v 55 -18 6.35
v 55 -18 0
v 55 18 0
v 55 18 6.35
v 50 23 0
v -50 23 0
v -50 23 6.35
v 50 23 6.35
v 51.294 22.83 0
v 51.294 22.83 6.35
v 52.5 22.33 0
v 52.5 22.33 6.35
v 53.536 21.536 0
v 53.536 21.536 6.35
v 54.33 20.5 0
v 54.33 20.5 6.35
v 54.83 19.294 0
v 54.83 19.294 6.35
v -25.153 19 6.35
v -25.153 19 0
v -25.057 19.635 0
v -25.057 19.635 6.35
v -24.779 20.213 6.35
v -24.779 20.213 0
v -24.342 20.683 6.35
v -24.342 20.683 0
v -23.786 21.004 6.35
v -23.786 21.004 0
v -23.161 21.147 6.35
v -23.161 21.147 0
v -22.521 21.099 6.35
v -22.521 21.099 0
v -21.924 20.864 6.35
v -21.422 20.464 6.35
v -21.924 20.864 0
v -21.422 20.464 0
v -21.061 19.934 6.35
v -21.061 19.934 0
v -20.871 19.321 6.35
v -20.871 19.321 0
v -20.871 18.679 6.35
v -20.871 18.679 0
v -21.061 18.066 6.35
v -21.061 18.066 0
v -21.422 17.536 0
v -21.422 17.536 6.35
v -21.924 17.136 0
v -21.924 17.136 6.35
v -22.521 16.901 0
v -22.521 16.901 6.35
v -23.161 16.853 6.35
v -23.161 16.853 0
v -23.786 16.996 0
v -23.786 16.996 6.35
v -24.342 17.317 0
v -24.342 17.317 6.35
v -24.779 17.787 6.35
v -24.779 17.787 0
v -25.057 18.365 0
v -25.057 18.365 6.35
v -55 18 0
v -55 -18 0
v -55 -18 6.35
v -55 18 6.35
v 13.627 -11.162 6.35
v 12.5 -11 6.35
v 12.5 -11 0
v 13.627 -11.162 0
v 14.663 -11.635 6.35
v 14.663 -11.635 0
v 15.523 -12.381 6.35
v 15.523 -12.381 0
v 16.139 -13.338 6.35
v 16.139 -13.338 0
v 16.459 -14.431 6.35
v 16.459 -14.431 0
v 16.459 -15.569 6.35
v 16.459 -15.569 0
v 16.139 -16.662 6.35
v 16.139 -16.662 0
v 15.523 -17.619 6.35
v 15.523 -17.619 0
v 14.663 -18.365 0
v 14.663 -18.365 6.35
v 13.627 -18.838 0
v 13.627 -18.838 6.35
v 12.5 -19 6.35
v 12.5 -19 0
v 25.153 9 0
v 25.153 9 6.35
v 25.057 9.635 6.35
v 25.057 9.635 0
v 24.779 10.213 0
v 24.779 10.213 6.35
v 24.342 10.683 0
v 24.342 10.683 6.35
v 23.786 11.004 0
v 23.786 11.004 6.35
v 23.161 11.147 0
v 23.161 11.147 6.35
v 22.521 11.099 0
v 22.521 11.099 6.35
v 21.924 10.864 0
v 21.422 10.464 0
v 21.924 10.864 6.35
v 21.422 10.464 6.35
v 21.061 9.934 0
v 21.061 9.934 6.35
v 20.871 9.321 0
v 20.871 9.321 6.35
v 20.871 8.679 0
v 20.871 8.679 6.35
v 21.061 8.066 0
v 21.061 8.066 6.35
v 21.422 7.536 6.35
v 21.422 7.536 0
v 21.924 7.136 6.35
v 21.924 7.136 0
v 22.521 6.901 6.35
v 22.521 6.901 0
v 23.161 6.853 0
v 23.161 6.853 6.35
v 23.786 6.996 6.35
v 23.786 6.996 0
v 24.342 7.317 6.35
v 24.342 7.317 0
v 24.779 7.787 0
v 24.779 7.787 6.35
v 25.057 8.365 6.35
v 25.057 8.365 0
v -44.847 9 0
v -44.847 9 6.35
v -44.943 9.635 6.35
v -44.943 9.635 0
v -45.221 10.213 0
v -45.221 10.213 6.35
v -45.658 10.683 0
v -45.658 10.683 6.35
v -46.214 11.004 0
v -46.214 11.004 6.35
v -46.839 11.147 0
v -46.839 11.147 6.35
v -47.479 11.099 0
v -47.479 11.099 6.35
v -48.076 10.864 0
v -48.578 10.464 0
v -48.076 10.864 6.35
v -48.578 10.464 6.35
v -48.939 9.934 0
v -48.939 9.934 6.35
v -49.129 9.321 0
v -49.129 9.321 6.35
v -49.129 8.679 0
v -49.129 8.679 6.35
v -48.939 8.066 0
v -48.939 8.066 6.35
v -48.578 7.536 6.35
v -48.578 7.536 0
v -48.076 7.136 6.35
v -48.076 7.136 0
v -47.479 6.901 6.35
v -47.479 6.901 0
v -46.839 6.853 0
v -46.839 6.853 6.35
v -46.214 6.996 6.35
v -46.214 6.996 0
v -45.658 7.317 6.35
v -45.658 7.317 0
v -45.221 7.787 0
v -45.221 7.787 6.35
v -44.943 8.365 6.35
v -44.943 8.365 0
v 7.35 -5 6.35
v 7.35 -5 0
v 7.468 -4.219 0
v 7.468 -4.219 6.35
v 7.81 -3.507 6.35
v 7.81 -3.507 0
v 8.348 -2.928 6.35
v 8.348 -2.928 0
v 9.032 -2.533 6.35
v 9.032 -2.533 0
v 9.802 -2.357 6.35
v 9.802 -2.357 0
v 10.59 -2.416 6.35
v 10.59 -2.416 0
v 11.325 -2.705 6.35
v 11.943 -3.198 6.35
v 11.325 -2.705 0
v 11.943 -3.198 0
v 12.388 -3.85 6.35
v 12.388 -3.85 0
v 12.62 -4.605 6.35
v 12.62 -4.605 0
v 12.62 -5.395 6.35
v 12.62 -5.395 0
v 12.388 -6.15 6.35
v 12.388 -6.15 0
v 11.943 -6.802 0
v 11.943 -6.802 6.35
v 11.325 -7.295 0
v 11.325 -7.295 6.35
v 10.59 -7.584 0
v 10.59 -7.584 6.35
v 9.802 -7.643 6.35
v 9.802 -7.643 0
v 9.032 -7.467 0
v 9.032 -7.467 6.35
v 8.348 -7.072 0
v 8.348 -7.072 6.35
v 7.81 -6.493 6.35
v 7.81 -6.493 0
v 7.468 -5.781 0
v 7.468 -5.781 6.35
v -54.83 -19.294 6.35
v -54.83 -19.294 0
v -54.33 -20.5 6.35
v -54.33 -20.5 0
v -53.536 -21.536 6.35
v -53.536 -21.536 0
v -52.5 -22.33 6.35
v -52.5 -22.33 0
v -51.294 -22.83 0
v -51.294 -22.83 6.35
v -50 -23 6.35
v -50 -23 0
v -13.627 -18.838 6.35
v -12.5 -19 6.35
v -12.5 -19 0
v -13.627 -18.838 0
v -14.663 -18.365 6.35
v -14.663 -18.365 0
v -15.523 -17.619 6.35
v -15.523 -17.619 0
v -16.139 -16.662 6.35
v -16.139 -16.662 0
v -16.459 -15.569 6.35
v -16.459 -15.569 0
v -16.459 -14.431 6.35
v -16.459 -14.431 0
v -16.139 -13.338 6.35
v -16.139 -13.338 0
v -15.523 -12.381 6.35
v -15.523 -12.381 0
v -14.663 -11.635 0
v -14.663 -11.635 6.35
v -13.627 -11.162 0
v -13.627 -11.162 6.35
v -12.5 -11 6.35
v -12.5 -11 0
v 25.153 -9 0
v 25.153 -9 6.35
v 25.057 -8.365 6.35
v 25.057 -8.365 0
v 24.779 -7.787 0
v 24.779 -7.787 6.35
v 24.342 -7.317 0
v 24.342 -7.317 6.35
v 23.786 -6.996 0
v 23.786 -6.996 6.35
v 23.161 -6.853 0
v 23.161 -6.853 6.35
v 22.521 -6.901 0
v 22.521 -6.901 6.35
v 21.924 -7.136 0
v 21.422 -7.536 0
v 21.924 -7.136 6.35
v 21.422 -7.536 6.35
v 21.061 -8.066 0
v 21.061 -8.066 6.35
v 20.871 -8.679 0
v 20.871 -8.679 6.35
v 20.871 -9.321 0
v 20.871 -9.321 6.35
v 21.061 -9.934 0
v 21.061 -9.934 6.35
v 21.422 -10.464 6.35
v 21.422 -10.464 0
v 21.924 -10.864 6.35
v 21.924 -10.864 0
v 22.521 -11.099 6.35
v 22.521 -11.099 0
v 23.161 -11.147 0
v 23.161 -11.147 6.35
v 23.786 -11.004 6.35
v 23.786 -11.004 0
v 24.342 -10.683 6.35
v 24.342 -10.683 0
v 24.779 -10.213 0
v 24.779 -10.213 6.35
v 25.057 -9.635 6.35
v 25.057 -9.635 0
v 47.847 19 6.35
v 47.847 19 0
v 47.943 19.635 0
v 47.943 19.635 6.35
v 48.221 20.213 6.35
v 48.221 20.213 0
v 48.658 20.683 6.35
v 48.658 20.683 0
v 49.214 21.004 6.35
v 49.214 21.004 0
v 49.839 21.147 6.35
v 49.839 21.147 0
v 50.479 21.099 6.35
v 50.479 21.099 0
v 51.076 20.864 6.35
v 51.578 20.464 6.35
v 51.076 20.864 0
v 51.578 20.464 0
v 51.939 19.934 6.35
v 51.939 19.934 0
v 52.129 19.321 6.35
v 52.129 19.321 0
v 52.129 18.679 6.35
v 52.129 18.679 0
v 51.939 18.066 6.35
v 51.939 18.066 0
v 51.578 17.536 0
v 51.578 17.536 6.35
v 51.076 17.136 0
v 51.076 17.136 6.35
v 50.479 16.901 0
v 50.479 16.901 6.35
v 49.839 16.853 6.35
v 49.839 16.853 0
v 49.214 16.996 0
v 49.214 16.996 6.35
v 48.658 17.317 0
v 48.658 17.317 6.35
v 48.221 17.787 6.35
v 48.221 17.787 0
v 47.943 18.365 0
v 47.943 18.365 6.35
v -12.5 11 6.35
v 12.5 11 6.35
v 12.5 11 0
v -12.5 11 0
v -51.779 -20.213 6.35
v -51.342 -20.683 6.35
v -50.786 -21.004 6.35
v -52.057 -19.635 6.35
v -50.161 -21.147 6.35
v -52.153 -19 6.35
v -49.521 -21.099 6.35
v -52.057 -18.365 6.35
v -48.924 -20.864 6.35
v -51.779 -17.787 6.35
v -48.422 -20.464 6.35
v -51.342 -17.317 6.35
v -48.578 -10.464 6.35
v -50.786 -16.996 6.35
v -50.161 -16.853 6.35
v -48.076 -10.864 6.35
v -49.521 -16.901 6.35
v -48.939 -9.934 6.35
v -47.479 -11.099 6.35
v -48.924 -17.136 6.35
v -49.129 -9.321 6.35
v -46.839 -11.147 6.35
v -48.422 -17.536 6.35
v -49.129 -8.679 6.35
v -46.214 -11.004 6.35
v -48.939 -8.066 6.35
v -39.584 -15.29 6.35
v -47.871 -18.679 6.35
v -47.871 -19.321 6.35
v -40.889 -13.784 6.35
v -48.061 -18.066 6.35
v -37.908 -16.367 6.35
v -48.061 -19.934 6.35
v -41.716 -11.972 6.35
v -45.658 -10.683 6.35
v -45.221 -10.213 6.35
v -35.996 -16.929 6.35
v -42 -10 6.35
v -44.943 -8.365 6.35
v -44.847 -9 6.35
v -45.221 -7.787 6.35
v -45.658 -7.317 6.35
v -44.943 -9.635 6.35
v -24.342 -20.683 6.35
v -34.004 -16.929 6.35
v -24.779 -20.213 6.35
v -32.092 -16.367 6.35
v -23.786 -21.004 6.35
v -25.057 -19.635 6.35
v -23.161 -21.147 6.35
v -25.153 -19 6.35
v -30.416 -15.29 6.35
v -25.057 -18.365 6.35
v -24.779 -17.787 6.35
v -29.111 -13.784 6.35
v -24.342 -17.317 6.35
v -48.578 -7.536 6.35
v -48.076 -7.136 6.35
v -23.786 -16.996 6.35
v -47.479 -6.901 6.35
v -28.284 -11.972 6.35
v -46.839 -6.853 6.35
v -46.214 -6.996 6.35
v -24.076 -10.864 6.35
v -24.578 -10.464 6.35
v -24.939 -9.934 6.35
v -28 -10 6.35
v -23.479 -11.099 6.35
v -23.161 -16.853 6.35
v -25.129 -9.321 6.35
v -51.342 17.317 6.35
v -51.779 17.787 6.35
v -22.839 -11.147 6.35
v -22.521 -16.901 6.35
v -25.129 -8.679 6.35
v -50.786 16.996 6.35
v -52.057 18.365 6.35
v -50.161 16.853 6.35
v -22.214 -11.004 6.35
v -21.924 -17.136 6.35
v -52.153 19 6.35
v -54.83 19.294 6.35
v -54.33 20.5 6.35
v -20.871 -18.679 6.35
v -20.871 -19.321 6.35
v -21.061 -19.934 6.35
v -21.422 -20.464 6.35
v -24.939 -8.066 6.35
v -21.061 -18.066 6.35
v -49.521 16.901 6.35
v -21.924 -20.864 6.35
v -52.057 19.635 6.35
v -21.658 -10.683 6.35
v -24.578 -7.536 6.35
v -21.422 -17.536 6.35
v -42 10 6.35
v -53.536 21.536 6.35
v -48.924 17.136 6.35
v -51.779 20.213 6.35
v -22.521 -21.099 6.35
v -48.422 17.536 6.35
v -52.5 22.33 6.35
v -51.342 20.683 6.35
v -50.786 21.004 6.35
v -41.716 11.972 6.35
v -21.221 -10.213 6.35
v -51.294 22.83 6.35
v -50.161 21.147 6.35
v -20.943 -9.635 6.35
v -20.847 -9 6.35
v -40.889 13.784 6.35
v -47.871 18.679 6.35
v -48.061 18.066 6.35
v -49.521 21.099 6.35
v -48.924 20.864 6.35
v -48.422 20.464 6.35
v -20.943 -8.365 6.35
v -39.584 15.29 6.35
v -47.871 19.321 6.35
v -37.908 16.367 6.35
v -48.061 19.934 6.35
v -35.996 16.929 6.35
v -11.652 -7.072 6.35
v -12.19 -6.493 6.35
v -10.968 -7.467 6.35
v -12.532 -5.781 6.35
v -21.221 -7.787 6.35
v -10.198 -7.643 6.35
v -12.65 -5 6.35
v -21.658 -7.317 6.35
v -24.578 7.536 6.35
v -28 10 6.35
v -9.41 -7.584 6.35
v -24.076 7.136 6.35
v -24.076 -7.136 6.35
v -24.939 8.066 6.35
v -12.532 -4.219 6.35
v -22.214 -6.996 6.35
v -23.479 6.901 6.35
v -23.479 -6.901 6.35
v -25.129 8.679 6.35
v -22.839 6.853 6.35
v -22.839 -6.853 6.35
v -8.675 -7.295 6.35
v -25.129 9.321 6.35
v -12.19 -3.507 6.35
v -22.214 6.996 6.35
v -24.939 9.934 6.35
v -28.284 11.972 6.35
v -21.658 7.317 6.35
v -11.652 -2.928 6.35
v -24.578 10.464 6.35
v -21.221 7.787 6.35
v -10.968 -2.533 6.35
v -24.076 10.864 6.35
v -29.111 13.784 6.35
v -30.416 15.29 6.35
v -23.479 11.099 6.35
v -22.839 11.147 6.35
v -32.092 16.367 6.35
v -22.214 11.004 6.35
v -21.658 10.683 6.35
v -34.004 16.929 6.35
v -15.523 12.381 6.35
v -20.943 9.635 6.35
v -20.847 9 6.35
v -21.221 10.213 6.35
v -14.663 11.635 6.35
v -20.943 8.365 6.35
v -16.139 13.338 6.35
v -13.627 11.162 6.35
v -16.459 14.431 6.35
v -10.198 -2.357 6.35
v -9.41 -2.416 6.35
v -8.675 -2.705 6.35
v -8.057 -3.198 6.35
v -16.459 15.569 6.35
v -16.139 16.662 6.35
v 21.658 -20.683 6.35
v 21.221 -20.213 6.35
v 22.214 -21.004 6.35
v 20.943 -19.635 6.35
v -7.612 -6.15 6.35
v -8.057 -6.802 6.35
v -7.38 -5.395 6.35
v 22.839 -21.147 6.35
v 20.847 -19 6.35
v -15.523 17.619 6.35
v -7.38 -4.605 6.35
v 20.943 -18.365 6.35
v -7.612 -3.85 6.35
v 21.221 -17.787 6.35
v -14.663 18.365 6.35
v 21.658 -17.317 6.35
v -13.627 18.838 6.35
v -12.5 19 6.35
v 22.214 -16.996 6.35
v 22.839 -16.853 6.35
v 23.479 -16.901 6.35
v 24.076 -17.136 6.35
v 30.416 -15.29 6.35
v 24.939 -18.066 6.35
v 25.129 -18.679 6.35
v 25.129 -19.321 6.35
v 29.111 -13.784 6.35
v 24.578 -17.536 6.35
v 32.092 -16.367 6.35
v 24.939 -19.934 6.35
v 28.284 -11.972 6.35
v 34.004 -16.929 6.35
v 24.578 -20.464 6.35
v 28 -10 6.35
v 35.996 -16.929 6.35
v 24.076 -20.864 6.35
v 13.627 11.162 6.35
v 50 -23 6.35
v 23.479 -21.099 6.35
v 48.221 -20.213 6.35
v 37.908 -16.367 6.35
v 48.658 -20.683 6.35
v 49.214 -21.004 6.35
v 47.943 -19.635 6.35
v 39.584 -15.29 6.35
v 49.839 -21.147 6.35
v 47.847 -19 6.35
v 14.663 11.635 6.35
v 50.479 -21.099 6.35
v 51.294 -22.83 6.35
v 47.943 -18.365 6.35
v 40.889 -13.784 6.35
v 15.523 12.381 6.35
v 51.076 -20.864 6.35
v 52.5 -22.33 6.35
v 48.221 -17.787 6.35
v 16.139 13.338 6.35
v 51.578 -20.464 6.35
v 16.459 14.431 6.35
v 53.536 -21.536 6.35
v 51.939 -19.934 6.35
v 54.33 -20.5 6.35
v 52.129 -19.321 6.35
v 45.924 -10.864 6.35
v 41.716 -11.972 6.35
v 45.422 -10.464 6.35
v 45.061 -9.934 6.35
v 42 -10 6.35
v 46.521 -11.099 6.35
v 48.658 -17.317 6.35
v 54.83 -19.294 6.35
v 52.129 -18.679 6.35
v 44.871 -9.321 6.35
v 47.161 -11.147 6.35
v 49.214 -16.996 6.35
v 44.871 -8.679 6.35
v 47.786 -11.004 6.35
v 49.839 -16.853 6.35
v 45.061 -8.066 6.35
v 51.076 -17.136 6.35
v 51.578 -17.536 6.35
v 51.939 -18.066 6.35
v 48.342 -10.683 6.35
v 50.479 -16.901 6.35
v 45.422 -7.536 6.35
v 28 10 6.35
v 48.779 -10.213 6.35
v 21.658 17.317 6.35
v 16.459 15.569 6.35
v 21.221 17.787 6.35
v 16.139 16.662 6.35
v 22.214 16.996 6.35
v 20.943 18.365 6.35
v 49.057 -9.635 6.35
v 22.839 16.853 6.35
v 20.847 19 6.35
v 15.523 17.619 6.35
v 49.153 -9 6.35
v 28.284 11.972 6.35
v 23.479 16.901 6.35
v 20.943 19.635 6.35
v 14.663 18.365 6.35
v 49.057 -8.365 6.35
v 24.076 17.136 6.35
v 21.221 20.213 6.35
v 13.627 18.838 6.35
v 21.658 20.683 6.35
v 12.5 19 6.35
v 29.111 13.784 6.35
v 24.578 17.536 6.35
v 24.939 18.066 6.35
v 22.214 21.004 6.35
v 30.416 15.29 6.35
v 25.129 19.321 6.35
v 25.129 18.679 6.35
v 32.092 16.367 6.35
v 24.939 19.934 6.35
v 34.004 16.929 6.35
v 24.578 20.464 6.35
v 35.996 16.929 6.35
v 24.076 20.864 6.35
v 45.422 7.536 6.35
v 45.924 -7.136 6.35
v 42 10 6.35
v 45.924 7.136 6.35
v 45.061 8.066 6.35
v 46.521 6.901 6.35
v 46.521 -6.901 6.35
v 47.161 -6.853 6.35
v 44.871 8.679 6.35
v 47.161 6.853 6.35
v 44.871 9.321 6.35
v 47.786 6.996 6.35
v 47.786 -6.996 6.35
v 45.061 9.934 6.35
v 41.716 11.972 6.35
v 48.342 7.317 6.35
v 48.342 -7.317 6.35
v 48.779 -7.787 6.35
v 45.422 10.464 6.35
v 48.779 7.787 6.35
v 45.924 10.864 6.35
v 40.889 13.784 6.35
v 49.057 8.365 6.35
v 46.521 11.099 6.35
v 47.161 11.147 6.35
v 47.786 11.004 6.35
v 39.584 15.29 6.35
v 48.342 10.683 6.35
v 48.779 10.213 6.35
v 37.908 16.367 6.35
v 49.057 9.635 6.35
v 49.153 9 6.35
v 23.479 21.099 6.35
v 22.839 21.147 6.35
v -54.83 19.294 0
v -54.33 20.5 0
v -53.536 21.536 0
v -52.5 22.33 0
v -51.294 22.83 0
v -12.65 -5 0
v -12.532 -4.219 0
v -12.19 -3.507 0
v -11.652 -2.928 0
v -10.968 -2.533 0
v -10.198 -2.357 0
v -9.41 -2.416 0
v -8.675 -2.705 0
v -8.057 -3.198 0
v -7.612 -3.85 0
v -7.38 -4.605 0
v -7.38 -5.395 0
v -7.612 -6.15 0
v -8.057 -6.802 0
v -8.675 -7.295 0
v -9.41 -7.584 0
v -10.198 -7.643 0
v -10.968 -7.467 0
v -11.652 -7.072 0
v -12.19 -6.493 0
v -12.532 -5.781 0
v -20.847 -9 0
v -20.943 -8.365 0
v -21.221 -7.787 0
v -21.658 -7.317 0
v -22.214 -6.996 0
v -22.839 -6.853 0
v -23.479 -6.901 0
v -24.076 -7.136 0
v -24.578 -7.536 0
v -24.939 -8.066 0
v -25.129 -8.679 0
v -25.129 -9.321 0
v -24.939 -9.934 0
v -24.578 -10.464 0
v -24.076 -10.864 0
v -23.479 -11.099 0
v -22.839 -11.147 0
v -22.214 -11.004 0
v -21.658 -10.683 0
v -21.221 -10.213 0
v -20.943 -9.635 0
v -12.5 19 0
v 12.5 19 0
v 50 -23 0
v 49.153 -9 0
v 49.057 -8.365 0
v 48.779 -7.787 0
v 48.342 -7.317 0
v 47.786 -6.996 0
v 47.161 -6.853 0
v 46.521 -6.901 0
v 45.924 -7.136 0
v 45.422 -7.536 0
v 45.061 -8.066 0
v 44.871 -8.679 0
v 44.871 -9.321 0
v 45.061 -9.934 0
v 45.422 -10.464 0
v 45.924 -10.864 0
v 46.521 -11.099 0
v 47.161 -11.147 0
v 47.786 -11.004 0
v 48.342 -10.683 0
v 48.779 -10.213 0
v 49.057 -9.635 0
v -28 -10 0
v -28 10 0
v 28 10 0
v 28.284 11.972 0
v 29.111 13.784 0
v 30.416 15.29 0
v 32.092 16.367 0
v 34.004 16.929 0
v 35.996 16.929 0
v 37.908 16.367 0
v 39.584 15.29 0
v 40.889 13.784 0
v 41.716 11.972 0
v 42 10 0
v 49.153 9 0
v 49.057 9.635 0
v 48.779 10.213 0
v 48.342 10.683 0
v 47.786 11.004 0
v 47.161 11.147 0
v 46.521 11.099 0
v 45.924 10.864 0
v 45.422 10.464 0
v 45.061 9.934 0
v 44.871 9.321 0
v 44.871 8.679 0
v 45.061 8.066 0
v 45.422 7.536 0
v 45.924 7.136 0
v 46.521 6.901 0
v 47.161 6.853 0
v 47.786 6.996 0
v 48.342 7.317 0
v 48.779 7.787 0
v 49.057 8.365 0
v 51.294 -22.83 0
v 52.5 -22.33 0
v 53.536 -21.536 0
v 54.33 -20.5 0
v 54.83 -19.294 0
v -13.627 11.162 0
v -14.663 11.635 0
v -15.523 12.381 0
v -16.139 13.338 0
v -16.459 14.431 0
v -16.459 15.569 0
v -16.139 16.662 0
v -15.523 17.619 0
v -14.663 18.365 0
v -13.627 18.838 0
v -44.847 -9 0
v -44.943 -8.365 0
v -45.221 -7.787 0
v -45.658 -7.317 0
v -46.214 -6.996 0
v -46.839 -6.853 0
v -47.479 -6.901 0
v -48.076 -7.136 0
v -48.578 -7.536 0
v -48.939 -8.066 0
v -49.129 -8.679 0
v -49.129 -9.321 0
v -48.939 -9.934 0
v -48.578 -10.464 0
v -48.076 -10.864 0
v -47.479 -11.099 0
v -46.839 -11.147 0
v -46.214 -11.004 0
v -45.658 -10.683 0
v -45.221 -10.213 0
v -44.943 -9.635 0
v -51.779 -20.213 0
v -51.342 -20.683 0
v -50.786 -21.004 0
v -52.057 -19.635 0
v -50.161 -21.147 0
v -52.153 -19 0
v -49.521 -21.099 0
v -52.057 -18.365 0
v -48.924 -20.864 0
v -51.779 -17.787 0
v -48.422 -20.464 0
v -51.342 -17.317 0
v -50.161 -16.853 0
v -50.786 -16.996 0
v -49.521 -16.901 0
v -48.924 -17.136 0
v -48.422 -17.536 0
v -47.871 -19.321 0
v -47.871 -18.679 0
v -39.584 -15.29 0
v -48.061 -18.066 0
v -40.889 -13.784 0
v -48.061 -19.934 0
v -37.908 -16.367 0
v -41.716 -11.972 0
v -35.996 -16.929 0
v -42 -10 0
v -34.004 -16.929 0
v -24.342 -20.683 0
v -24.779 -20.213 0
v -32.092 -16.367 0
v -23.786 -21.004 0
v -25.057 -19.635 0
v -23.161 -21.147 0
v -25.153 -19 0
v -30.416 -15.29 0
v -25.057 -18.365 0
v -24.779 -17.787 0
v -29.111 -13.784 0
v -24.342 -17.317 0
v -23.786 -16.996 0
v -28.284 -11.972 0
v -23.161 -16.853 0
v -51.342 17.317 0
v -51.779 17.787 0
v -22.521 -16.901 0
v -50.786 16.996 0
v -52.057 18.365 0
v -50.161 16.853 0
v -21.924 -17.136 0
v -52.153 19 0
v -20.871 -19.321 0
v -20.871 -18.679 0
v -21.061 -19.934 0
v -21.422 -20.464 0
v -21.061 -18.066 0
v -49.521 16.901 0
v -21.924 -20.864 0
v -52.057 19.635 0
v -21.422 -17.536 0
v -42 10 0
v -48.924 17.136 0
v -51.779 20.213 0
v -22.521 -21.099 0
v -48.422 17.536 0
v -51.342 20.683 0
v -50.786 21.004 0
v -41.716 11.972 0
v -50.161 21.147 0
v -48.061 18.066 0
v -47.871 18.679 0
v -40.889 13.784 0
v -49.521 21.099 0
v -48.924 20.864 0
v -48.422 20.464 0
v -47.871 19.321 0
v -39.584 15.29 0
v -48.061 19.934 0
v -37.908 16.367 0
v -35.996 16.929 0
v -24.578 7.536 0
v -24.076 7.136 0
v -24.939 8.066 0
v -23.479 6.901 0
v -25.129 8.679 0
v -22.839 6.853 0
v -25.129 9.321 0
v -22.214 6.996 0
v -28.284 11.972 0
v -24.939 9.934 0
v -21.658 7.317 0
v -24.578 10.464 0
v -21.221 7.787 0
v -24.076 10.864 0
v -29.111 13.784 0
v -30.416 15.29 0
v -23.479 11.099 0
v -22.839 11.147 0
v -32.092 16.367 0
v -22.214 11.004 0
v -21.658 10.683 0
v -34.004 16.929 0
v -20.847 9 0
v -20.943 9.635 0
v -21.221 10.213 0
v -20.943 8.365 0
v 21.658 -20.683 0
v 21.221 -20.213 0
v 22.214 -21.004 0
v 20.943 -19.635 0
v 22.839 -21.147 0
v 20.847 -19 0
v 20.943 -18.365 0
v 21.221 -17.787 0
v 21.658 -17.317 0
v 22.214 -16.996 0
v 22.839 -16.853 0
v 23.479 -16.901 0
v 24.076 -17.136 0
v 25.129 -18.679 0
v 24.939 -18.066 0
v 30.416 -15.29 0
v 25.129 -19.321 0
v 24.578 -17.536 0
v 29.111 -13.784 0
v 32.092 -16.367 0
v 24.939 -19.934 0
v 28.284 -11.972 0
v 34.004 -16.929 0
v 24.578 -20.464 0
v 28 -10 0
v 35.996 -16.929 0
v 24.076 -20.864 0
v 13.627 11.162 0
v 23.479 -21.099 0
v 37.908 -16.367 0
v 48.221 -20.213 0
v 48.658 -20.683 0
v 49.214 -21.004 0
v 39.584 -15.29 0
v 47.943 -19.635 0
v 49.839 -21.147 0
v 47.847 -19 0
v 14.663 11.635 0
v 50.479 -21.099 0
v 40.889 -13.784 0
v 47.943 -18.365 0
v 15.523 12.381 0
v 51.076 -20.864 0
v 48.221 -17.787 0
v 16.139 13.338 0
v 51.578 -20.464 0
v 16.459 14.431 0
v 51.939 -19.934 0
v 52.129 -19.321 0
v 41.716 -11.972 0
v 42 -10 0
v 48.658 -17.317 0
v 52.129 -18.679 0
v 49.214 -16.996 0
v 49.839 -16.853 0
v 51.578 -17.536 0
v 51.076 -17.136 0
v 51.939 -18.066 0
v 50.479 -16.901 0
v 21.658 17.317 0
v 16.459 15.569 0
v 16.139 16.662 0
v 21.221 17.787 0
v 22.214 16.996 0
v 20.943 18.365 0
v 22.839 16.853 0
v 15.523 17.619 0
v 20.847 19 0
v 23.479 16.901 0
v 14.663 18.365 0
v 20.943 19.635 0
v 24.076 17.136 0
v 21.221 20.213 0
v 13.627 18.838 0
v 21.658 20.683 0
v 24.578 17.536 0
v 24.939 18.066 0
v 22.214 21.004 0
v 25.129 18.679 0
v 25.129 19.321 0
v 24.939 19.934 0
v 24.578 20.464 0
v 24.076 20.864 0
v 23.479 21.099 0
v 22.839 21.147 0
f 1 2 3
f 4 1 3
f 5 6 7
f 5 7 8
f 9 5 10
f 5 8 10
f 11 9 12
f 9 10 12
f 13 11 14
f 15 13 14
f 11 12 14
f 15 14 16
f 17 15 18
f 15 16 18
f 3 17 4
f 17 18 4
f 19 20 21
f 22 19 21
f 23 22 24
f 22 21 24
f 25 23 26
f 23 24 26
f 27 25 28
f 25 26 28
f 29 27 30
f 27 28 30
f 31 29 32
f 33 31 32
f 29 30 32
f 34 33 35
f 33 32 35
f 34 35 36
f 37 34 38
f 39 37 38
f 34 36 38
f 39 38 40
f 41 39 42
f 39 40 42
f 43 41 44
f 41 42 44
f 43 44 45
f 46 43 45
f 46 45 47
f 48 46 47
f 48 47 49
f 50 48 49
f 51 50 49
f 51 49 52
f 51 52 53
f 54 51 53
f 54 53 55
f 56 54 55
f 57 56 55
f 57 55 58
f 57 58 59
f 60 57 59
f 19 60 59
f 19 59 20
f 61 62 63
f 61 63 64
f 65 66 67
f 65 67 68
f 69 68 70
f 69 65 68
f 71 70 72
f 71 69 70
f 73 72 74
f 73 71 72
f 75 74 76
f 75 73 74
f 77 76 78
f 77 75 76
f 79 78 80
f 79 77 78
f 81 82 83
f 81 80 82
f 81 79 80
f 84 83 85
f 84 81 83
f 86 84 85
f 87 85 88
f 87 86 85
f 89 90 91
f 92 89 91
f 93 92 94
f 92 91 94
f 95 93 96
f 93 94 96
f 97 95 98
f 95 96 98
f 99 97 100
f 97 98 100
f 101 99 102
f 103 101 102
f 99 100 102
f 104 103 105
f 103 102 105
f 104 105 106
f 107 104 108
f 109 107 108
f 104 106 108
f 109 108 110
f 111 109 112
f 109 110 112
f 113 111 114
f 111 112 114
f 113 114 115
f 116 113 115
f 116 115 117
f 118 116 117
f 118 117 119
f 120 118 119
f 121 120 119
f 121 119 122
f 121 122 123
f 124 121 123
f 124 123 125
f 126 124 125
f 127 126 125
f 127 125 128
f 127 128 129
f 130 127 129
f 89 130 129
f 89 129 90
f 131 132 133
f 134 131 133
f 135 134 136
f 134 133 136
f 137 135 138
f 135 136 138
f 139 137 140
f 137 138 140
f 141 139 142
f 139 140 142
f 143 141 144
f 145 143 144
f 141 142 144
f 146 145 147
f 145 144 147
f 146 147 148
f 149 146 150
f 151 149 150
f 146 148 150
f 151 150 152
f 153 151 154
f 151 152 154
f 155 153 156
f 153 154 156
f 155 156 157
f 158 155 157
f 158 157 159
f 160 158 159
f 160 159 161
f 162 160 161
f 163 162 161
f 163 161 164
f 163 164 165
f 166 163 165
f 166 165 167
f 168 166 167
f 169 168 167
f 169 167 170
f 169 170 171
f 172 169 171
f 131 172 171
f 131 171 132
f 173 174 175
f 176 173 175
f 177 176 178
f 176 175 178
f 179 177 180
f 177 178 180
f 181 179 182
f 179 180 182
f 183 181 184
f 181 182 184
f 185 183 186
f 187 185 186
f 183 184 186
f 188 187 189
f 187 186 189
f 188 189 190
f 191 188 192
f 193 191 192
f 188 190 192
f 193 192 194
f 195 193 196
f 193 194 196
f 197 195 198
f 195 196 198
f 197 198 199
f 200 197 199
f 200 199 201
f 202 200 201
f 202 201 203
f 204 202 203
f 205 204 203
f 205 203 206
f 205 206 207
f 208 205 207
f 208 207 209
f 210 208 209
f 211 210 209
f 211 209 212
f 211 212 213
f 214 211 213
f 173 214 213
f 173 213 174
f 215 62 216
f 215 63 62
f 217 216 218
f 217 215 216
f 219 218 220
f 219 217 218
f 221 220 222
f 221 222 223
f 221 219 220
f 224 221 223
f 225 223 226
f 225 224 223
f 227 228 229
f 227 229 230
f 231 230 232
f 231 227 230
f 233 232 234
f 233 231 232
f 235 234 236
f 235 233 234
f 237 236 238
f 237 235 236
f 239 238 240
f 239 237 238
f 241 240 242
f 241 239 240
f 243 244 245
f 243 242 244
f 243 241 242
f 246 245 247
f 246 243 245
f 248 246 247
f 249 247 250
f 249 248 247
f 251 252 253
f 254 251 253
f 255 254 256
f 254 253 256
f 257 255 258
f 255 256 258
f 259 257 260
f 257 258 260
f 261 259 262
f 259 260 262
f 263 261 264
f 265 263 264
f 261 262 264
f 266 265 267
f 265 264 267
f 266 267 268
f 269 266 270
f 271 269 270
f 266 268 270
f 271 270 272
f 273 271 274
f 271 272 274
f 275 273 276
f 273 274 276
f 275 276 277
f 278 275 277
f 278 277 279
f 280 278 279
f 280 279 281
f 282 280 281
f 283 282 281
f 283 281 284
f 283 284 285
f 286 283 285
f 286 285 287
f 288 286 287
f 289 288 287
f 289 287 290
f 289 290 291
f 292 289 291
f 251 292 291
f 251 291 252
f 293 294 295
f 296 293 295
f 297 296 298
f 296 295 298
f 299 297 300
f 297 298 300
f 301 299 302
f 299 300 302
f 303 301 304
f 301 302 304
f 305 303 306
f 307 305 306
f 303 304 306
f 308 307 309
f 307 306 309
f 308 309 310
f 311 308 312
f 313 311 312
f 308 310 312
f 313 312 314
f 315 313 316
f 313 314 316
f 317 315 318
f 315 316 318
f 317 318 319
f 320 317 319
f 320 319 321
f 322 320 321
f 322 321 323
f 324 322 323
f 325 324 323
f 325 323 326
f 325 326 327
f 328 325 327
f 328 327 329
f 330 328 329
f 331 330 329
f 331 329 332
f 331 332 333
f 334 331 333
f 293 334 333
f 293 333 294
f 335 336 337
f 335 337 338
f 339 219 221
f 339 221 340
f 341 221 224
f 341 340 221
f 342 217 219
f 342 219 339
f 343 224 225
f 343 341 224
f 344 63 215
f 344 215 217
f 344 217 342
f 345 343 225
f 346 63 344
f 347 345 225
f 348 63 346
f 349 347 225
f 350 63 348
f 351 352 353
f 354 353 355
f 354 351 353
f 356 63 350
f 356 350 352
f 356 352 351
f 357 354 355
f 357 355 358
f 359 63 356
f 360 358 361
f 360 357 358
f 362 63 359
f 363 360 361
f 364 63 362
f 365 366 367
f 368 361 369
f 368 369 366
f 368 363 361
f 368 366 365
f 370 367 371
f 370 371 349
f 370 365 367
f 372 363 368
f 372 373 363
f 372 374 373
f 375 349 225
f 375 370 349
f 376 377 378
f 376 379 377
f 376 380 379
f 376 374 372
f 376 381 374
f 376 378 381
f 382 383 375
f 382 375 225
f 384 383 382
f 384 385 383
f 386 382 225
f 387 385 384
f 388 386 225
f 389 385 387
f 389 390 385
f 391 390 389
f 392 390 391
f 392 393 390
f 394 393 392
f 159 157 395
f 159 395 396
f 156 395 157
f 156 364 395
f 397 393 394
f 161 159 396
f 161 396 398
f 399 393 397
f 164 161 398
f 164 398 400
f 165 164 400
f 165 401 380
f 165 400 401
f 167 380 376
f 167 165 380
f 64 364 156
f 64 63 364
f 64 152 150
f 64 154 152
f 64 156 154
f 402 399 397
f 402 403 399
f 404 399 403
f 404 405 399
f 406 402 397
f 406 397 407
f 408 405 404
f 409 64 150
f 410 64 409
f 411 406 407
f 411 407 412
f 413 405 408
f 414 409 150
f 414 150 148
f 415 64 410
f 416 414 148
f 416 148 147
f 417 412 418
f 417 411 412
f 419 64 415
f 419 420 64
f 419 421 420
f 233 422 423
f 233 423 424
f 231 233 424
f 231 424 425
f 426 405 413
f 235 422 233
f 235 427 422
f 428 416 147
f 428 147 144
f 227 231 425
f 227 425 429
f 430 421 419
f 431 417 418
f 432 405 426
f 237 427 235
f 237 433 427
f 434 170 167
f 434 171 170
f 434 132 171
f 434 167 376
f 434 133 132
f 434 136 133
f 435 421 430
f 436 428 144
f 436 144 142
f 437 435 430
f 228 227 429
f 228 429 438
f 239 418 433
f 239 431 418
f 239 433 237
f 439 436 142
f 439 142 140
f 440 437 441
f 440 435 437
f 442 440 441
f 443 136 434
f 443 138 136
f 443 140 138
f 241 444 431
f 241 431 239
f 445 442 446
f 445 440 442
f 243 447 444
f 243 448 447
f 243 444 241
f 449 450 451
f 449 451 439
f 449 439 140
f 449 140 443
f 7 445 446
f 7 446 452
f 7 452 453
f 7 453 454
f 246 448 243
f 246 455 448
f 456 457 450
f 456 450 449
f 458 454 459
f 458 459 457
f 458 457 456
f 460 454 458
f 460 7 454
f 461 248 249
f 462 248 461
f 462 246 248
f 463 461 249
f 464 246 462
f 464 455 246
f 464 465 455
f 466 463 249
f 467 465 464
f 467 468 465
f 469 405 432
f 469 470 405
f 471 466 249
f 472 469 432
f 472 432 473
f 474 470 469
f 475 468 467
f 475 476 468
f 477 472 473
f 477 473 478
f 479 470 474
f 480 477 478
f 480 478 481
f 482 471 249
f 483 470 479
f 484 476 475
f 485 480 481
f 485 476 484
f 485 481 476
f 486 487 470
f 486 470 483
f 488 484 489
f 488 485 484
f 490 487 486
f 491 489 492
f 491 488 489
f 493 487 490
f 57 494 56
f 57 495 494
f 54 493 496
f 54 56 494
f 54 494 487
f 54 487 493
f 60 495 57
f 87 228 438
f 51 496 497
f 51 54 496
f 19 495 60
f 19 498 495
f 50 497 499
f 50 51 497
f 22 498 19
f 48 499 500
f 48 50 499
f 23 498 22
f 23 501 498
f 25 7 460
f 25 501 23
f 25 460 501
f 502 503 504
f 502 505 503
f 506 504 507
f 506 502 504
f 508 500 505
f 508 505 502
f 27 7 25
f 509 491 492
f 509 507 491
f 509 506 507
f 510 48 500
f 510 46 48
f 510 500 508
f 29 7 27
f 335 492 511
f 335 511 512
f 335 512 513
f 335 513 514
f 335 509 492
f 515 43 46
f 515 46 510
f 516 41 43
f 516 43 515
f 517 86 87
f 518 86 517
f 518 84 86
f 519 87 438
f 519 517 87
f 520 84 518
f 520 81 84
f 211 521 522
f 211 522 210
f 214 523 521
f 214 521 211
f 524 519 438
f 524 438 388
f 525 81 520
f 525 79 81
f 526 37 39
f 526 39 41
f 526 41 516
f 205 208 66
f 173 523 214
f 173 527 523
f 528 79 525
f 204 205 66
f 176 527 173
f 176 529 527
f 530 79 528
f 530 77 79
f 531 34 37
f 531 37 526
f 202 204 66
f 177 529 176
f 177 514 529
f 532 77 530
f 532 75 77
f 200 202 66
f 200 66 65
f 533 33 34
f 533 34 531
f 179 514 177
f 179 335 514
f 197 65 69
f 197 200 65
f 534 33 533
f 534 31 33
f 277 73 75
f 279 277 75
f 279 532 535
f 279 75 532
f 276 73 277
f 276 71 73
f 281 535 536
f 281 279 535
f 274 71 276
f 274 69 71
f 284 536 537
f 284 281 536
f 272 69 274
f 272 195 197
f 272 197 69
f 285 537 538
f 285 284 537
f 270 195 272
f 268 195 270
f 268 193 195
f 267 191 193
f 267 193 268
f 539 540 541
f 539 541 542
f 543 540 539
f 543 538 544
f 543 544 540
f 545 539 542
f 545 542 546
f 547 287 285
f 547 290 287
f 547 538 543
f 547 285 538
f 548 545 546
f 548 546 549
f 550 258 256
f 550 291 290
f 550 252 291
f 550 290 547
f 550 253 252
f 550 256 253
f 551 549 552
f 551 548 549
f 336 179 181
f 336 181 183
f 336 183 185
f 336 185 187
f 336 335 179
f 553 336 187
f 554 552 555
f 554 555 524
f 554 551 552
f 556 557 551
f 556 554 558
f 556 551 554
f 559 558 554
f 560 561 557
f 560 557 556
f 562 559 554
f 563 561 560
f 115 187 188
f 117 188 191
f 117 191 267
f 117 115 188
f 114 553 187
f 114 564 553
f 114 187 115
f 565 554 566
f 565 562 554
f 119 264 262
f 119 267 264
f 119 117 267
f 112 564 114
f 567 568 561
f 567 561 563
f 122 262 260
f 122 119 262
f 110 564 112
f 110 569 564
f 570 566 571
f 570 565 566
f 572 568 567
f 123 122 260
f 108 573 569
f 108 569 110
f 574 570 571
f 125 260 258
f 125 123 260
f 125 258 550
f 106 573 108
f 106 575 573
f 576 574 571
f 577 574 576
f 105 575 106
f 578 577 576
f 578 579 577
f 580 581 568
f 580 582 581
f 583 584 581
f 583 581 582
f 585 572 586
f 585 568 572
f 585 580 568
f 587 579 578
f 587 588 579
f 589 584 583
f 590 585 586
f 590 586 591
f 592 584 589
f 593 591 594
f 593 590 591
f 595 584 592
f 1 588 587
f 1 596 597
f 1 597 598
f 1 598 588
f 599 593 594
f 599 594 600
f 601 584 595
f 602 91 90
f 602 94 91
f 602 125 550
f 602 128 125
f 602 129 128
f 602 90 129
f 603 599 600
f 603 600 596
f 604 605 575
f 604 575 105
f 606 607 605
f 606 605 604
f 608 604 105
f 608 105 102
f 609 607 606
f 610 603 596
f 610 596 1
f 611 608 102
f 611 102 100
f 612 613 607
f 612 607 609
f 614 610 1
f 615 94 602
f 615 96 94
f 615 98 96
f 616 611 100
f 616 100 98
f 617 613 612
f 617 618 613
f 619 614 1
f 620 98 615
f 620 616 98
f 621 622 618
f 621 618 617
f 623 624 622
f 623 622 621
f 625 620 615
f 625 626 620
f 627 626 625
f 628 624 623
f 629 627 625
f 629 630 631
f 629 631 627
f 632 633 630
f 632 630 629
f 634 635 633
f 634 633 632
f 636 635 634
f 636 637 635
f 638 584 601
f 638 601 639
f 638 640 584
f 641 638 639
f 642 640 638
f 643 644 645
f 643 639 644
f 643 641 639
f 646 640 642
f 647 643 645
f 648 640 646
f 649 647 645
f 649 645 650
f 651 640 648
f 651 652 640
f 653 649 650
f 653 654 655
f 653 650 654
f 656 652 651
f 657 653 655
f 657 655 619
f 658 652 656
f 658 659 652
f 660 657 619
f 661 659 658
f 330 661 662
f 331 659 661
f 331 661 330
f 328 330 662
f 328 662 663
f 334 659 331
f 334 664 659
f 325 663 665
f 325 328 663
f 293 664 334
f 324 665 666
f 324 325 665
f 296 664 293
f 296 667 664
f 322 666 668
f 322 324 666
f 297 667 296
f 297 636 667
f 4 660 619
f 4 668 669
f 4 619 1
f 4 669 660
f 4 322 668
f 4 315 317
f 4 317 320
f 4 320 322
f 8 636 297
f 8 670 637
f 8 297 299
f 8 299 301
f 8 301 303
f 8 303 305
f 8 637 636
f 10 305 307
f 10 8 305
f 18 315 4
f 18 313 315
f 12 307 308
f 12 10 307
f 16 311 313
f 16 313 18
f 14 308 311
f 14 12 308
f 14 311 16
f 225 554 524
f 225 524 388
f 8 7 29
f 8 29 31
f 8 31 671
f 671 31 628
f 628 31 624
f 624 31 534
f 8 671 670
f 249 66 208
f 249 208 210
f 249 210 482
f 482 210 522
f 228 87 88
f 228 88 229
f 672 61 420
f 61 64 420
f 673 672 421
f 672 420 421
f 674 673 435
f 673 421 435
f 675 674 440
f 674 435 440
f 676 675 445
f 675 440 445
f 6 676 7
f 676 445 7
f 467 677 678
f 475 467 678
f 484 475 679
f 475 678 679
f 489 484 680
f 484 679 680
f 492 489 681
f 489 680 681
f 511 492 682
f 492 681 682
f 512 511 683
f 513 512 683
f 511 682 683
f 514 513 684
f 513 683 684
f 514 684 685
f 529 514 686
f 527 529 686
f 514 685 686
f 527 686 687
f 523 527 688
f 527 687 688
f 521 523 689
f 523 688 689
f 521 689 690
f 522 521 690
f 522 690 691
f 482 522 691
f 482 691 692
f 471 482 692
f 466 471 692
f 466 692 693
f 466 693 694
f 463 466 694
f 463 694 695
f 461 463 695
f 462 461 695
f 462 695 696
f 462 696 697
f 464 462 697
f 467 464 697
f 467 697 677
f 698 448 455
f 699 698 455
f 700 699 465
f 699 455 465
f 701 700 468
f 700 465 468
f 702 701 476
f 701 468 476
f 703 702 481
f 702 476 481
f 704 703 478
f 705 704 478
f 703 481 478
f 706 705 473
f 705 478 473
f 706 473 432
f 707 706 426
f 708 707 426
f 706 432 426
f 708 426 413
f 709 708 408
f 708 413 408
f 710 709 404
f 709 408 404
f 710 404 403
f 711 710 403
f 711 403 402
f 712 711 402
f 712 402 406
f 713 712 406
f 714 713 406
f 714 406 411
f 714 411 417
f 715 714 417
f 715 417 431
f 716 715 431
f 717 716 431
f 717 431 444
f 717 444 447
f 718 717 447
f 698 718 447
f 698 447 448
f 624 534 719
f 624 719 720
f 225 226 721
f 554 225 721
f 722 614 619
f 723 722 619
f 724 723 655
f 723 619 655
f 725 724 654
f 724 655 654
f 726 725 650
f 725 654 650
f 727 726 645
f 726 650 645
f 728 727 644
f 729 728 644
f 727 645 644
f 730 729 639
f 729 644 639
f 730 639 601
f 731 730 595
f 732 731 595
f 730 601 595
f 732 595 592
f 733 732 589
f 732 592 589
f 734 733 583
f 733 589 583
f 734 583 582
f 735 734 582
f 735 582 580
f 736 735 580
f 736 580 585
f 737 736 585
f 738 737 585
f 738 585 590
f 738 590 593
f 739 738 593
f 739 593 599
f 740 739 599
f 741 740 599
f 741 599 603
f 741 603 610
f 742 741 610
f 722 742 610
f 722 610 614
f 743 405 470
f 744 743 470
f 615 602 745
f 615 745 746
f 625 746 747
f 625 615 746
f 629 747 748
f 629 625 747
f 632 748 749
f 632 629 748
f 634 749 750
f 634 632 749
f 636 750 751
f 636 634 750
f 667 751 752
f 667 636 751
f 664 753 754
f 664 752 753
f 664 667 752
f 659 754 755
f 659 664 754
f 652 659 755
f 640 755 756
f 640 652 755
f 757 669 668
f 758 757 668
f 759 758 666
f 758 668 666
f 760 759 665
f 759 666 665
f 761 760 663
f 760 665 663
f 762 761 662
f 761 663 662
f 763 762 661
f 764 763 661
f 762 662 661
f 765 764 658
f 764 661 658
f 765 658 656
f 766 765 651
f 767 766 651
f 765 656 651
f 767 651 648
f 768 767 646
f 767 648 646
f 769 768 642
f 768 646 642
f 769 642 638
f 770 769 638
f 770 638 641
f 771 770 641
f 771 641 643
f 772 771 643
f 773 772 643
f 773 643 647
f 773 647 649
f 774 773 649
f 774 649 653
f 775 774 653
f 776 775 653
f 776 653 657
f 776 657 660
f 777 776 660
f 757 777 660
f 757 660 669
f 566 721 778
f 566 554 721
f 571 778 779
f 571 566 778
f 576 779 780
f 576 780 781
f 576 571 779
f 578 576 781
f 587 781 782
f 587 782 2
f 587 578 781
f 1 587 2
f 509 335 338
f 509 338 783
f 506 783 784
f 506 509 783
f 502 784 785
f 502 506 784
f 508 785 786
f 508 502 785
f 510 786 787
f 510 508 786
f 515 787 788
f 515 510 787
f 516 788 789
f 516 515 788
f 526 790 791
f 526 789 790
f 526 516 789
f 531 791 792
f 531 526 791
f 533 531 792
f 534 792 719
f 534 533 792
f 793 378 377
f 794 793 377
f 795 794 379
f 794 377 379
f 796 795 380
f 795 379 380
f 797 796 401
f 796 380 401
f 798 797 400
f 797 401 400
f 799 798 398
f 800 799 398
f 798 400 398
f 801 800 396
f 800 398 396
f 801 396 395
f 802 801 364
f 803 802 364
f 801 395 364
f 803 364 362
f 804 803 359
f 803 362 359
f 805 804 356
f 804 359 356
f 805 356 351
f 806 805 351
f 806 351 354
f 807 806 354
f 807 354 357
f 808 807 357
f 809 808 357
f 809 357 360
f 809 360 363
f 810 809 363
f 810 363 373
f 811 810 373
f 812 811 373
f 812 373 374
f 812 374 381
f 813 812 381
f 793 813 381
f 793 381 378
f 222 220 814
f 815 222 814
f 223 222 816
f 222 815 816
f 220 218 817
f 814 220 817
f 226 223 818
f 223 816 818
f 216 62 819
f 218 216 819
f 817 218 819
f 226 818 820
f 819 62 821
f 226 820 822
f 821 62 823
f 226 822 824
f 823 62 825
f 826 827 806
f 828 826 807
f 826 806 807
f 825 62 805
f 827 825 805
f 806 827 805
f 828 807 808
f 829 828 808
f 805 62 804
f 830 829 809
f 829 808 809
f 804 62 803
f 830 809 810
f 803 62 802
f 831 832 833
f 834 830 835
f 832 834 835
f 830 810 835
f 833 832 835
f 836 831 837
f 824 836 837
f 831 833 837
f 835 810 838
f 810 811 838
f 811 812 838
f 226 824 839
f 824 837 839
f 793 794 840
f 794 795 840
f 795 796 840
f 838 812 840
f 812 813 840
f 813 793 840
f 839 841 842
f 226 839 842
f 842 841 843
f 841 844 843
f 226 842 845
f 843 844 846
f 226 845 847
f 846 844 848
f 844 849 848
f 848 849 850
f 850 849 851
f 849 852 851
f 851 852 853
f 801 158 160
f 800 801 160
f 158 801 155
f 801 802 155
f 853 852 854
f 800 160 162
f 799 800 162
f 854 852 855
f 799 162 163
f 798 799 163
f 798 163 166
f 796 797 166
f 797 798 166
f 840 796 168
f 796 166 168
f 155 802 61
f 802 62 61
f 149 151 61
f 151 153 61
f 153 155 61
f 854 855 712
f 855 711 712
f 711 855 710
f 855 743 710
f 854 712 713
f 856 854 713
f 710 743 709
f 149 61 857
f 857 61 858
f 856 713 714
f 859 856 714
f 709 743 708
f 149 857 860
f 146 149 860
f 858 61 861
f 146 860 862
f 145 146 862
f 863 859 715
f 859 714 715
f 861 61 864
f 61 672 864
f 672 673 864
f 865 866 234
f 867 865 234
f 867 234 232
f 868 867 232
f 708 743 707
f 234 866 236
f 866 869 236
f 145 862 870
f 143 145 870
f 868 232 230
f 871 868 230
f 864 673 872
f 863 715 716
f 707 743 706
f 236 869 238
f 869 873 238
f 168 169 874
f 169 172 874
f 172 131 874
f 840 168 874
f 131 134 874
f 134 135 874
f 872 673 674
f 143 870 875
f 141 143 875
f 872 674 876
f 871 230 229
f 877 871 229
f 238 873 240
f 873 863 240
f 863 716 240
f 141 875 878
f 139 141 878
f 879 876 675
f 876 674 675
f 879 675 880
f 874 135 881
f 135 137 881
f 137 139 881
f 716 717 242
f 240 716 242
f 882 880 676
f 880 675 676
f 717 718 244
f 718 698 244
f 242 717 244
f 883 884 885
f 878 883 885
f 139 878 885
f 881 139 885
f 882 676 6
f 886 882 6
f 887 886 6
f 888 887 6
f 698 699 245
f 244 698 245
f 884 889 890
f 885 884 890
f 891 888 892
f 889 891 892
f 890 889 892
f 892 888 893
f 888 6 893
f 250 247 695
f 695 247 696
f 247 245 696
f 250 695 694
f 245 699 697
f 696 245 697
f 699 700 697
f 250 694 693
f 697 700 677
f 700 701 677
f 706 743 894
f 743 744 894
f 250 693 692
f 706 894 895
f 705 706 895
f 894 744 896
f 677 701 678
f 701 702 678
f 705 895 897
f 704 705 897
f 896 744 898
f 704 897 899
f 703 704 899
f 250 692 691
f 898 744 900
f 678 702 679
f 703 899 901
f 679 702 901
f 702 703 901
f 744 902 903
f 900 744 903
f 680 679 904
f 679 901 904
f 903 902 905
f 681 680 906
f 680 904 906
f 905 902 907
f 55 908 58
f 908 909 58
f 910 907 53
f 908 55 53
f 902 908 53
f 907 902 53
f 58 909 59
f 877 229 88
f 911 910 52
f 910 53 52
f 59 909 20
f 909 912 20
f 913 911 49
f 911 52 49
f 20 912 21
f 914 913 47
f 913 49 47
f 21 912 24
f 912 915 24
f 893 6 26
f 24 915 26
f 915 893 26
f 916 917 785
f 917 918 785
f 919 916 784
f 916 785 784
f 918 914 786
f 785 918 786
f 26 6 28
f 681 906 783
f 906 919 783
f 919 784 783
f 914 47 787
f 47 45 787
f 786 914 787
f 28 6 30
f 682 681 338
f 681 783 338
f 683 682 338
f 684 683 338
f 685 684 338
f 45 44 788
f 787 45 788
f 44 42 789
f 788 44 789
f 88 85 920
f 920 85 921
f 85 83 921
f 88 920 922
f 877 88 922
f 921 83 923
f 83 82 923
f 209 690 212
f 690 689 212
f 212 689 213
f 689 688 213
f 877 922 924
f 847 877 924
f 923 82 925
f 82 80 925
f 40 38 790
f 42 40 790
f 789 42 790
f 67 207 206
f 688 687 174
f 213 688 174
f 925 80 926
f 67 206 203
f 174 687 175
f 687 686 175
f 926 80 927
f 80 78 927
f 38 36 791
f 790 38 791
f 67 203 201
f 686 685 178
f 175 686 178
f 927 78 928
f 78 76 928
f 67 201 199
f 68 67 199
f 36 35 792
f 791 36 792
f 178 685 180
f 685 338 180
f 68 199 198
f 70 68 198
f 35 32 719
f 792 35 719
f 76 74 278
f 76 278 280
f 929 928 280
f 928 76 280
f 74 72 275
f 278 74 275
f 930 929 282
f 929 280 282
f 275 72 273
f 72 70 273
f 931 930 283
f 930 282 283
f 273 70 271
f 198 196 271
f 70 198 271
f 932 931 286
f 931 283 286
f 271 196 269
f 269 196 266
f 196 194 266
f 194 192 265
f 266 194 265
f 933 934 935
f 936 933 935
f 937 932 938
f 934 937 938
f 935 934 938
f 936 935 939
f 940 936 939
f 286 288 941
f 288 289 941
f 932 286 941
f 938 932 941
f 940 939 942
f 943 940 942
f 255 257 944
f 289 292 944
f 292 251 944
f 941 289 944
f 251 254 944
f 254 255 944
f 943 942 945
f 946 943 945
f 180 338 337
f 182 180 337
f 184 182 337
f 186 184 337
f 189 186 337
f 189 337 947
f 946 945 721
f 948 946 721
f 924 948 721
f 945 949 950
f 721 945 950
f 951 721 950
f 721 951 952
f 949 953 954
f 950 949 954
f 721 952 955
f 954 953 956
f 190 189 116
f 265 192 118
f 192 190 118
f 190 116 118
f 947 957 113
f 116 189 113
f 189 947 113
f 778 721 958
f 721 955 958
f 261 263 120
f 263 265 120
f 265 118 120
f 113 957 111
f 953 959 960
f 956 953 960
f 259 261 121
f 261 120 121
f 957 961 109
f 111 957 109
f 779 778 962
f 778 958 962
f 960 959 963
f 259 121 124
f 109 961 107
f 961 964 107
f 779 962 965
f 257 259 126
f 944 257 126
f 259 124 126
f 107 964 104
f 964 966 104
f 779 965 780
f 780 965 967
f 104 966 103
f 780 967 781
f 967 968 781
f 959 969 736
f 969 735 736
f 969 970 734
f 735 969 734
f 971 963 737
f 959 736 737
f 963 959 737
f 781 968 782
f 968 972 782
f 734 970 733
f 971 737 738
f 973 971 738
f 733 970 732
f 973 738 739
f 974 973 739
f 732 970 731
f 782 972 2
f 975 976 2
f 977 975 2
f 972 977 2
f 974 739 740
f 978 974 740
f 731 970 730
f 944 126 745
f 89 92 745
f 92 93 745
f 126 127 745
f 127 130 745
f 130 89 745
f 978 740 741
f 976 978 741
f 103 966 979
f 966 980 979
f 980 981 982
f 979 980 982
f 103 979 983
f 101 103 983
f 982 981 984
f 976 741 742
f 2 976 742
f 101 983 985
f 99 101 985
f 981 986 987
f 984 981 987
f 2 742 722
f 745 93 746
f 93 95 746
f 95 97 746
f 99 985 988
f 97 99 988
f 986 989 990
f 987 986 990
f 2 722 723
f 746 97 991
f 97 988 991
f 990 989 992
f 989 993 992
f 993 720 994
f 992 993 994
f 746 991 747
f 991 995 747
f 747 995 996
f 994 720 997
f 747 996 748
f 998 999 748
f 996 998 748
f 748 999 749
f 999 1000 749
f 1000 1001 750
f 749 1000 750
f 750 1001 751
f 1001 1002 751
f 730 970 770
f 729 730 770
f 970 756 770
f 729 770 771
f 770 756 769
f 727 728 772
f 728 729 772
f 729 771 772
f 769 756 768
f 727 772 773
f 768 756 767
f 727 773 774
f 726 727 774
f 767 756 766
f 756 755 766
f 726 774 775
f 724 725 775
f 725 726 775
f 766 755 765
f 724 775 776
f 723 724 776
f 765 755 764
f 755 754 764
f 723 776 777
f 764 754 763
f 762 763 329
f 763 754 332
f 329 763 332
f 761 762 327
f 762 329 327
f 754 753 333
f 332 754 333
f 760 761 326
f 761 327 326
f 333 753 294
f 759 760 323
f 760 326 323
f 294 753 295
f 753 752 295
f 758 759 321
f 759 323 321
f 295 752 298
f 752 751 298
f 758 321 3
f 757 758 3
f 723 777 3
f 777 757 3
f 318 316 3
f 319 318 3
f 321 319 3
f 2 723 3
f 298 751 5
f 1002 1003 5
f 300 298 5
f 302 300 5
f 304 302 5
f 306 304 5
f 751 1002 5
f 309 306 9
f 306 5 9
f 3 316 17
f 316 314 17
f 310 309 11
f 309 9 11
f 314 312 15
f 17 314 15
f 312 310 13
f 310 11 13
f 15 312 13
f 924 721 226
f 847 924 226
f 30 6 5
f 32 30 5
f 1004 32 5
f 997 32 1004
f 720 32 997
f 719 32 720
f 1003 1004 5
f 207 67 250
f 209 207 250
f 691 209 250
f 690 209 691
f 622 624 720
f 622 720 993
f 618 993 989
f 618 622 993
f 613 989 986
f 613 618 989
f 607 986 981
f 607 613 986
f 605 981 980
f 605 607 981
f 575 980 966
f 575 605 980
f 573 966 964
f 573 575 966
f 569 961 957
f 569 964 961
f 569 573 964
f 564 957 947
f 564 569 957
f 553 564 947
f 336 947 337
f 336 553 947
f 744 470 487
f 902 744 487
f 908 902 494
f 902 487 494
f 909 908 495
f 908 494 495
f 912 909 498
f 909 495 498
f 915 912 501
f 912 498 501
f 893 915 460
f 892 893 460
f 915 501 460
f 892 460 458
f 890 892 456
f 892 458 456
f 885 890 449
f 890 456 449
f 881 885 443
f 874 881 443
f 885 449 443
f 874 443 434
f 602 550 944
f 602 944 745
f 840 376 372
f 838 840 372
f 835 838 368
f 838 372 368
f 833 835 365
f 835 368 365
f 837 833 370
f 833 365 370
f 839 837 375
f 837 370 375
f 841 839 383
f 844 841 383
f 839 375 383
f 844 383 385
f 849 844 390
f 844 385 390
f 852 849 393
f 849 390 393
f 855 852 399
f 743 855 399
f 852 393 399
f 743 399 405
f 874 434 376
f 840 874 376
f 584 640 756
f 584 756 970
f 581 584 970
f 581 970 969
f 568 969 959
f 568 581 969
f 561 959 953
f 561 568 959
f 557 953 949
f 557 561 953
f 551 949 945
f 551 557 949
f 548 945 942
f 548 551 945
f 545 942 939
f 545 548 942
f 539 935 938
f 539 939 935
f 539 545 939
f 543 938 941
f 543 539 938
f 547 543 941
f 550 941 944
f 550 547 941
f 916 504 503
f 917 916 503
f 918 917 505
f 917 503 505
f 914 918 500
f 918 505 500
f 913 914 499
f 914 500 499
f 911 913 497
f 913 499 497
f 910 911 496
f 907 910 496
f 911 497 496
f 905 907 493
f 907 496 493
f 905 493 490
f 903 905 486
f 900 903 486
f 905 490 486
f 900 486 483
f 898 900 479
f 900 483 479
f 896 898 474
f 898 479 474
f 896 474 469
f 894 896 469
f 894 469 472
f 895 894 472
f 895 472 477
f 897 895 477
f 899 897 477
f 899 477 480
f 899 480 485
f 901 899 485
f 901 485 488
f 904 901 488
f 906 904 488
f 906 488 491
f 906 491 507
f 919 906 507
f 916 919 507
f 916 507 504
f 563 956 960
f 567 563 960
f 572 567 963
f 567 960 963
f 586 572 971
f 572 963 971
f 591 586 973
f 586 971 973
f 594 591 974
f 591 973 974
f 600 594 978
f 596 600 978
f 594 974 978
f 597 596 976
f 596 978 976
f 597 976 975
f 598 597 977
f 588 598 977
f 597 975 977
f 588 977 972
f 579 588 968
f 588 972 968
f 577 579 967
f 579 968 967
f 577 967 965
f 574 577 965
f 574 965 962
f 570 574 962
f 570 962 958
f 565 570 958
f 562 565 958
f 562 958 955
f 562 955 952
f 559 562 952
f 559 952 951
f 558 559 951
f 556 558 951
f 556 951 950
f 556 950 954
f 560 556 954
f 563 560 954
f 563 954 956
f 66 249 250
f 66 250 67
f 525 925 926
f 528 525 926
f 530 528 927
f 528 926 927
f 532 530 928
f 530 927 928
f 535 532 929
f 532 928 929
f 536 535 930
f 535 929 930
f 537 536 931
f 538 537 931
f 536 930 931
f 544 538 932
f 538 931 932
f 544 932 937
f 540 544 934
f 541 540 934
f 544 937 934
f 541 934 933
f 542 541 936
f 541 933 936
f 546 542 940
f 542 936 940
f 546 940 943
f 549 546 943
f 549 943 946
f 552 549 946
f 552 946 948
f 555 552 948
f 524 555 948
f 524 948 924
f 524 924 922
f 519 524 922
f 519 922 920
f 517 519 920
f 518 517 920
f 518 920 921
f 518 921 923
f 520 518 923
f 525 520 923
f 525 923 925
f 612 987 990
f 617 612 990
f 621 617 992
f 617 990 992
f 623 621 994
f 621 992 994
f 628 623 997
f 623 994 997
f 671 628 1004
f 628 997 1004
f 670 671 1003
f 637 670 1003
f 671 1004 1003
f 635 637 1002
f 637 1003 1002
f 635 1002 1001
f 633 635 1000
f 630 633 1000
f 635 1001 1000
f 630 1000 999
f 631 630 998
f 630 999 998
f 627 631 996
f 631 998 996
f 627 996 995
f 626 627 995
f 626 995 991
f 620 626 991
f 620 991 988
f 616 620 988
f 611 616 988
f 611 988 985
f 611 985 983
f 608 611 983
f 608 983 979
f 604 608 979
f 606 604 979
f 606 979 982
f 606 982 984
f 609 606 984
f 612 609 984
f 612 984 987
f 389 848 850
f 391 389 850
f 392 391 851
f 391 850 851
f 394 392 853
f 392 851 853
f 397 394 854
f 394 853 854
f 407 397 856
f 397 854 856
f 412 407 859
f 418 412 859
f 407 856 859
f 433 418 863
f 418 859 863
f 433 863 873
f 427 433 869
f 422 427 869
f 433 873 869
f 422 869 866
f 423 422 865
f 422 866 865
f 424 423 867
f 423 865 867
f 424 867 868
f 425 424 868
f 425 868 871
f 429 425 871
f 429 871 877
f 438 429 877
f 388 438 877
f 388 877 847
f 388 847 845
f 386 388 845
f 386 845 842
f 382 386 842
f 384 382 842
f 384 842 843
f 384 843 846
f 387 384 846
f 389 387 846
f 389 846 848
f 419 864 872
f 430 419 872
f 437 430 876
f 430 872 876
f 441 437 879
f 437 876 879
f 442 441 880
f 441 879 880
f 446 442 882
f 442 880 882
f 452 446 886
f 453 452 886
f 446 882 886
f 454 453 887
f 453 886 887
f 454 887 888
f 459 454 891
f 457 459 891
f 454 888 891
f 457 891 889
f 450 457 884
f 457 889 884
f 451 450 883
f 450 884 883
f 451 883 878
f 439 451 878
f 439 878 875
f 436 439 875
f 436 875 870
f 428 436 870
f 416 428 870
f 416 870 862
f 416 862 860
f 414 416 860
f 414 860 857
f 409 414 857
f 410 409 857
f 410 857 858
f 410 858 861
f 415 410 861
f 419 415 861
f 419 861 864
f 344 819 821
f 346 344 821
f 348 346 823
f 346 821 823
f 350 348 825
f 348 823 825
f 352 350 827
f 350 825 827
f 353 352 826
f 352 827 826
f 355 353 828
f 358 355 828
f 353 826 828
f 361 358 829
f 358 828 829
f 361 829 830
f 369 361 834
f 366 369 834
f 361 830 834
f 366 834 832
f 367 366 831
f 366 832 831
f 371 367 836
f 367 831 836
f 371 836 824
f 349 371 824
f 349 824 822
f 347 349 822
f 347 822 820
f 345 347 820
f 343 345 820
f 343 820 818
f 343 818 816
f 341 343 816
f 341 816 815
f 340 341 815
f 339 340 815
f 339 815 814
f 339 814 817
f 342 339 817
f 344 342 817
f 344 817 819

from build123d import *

# Parameters (mm, degrees)
SKETCH1_W             = 110
SKETCH1_H             = 46
BOSS_EXTRUDE1_DEPTH   = 6.35
F_8_CLEARANCE_HOLE2_D = 4.3053
FILLET1_R             = 5
M5_CLEARANCE_HOLE1_D  = 5.3
F_8_CLEARANCE_HOLE1_D = 4.3053
SKETCH13_R            = 2.15265
CUT_EXTRUDE2_DEPTH    = 10
CUT_EXTRUDE3_DEPTH    = 7.35


with BuildPart() as part:
    # Sketch1 → Boss-Extrude1 (new body)
    with BuildSketch(Plane.XY):
        Rectangle(SKETCH1_W, SKETCH1_H)
    extrude(amount=BOSS_EXTRUDE1_DEPTH)

    # #8 Clearance Hole2 (through all)
    with Locations(Plane(origin=(0, 0, 0), x_dir=(-1, 0, 0), z_dir=(0, 0, -1))):
        with Locations((-47, 9), (-23, 9), (-23, -9), (-47, -9), (23, -9), (23, 9), (47, 9), (47, -9)):
            Hole(F_8_CLEARANCE_HOLE2_D / 2)

    # Fillet1
    fillet1_edges = [part.edges().sort_by_distance(p)[0] for p in [
        (-55, -23, 3.175),
        (-55, 23, 3.175),
        (55, 23, 3.175),
        (55, -23, 3.175),
    ]]
    fillet(fillet1_edges, radius=FILLET1_R)

    # M5 Clearance Hole1 (through all)
    with Locations(Plane.XY.offset(6.35)):
        with Locations((-10, -5), (10, -5)):
            Hole(M5_CLEARANCE_HOLE1_D / 2)

    # #8 Clearance Hole1 (through all)
    with Locations(Plane.XY.offset(6.35)):
        with Locations((-23, 19), (-23, -19), (23, -19), (23, 19), (-50, 19), (-50, -19), (50, -19), (50, 19)):
            Hole(F_8_CLEARANCE_HOLE1_D / 2)

    # Sketch13 → Cut-Extrude2 (cut)
    with BuildSketch(Plane.XY.offset(6.35)):
        with Locations((47, 9)):
            Circle(SKETCH13_R)
        with Locations((23, -9)):
            Circle(SKETCH13_R)
        with Locations((23, 9)):
            Circle(SKETCH13_R)
        with Locations((47, -9)):
            Circle(SKETCH13_R)
        with BuildLine():
            Line((42, 10), (42, -10))
            ThreePointArc((42, -10), (35, -17), (28, -10))
            Line((28, -10), (28, 10))
            ThreePointArc((28, 10), (35, 17), (42, 10))
        make_face()
        with BuildLine():
            Line((-42, 10), (-42, -10))
            ThreePointArc((-42, -10), (-35, -17), (-28, -10))
            Line((-28, -10), (-28, 10))
            ThreePointArc((-28, 10), (-35, 17), (-42, 10))
        make_face()
    extrude(amount=-CUT_EXTRUDE2_DEPTH, mode=Mode.SUBTRACT)

    # Sketch14 → Cut-Extrude3 (cut, through all)
    with BuildSketch(Plane.XY.offset(6.35)):
        with BuildLine():
            Line((-12.5, -11), (12.5, -11))
            ThreePointArc((12.5, -11), (16.5, -15), (12.5, -19))
            Line((12.5, -19), (-12.5, -19))
            ThreePointArc((-12.5, -19), (-16.5, -15), (-12.5, -11))
        make_face()
        with BuildLine():
            Line((-12.5, 19), (12.5, 19))
            ThreePointArc((12.5, 19), (16.5, 15), (12.5, 11))
            Line((12.5, 11), (-12.5, 11))
            ThreePointArc((-12.5, 11), (-16.5, 15), (-12.5, 19))
        make_face()
    extrude(amount=-CUT_EXTRUDE3_DEPTH, mode=Mode.SUBTRACT)


solid = part.part
